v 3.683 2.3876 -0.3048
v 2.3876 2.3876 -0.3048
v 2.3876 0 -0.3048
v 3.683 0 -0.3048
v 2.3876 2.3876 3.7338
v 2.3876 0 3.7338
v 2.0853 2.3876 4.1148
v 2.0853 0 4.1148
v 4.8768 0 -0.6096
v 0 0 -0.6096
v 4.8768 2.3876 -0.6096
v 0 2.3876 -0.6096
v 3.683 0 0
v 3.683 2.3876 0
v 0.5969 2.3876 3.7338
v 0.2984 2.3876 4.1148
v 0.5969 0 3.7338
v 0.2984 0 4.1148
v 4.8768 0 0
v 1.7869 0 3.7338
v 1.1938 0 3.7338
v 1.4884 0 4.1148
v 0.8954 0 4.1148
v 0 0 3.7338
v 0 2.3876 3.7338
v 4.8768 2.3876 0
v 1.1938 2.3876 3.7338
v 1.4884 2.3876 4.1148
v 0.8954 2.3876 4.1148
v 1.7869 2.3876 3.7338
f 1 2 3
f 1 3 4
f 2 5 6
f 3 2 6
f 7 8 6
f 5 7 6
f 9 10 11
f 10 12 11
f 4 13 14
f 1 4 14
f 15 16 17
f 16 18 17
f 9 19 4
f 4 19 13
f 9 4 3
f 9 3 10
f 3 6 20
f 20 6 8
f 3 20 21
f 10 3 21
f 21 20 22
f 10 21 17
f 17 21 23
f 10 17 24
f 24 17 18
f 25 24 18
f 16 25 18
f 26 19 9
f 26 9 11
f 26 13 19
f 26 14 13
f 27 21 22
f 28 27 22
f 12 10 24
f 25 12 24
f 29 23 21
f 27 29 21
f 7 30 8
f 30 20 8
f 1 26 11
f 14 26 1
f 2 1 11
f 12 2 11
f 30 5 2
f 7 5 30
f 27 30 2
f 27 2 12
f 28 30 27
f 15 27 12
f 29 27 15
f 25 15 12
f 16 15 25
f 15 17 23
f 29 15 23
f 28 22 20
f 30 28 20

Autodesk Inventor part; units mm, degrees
sketch "Sketch_1" plane through (0, 0, 0) normal (0, 1, 0) x (-1, 0, 0)
  line L0 (0, 3.7338) -> (-0.2984, 4.1148)
  line L1 (-0.2984, 4.1148) -> (-0.5969, 3.7338)
  line L2 (-0.5969, 3.7338) -> (-0.8954, 4.1148)
  line L3 (-0.8954, 4.1148) -> (-1.1938, 3.7338)
  line L4 (-1.1938, 3.7338) -> (-1.4884, 4.1148)
  line L5 (-1.4884, 4.1148) -> (-1.7869, 3.7338)
  line L6 (-1.7869, 3.7338) -> (-2.0853, 4.1148)
  line L7 (-2.0853, 4.1148) -> (-2.3876, 3.7338)
  line L8 (-2.3876, 3.7338) -> (-2.3876, 0)
  line L9 (-2.3876, 0) -> (0, 0)
  line L10 (0, 0) -> (0, 3.7338)
extrude "Extrusion1" add sketch "Sketch_1" along normal blind 2.3876
sketch "Sketch_2" plane through (0, 0, 0) normal (0, 0, 1) x (1, 0, 0)
  line L0 (0, 2.3876) -> (0, 0)
  line L1 (0, 0) -> (4.8768, 0)
  line L2 (4.8768, 0) -> (4.8768, 2.3876)
  line L3 (4.8768, 2.3876) -> (0, 2.3876)
extrude "Extrusion2" add sketch "Sketch_2" against normal blind 0.6096
sketch "Sketch_3" plane through (0, 0, 0) normal (0, 0, 1) x (1, 0, 0)
  line L0 (2.3876, 2.3876) -> (2.3876, 0)
  line L1 (2.3876, 0) -> (3.683, 0)
  line L2 (3.683, 0) -> (3.683, 2.3876)
  line L3 (3.683, 2.3876) -> (2.3876, 2.3876)
extrude "Extrusion3" cut sketch "Sketch_3" against normal blind 0.3048
ref_plane "body_right1c_XY" through (2.3876, 1.1938, -0.6096) normal (0, 0, 1) x (1, 0, 0)
ref_plane "body_right1c_YZ" through (2.3876, 1.1938, -0.6096) normal (1, 0, 0) x (0, 1, 0)
ref_plane "body_right1c_ZX" through (2.3876, 1.1938, -0.6096) normal (0, 1, 0) x (0, 0, 1)
properties part number "AS11CHcright"
